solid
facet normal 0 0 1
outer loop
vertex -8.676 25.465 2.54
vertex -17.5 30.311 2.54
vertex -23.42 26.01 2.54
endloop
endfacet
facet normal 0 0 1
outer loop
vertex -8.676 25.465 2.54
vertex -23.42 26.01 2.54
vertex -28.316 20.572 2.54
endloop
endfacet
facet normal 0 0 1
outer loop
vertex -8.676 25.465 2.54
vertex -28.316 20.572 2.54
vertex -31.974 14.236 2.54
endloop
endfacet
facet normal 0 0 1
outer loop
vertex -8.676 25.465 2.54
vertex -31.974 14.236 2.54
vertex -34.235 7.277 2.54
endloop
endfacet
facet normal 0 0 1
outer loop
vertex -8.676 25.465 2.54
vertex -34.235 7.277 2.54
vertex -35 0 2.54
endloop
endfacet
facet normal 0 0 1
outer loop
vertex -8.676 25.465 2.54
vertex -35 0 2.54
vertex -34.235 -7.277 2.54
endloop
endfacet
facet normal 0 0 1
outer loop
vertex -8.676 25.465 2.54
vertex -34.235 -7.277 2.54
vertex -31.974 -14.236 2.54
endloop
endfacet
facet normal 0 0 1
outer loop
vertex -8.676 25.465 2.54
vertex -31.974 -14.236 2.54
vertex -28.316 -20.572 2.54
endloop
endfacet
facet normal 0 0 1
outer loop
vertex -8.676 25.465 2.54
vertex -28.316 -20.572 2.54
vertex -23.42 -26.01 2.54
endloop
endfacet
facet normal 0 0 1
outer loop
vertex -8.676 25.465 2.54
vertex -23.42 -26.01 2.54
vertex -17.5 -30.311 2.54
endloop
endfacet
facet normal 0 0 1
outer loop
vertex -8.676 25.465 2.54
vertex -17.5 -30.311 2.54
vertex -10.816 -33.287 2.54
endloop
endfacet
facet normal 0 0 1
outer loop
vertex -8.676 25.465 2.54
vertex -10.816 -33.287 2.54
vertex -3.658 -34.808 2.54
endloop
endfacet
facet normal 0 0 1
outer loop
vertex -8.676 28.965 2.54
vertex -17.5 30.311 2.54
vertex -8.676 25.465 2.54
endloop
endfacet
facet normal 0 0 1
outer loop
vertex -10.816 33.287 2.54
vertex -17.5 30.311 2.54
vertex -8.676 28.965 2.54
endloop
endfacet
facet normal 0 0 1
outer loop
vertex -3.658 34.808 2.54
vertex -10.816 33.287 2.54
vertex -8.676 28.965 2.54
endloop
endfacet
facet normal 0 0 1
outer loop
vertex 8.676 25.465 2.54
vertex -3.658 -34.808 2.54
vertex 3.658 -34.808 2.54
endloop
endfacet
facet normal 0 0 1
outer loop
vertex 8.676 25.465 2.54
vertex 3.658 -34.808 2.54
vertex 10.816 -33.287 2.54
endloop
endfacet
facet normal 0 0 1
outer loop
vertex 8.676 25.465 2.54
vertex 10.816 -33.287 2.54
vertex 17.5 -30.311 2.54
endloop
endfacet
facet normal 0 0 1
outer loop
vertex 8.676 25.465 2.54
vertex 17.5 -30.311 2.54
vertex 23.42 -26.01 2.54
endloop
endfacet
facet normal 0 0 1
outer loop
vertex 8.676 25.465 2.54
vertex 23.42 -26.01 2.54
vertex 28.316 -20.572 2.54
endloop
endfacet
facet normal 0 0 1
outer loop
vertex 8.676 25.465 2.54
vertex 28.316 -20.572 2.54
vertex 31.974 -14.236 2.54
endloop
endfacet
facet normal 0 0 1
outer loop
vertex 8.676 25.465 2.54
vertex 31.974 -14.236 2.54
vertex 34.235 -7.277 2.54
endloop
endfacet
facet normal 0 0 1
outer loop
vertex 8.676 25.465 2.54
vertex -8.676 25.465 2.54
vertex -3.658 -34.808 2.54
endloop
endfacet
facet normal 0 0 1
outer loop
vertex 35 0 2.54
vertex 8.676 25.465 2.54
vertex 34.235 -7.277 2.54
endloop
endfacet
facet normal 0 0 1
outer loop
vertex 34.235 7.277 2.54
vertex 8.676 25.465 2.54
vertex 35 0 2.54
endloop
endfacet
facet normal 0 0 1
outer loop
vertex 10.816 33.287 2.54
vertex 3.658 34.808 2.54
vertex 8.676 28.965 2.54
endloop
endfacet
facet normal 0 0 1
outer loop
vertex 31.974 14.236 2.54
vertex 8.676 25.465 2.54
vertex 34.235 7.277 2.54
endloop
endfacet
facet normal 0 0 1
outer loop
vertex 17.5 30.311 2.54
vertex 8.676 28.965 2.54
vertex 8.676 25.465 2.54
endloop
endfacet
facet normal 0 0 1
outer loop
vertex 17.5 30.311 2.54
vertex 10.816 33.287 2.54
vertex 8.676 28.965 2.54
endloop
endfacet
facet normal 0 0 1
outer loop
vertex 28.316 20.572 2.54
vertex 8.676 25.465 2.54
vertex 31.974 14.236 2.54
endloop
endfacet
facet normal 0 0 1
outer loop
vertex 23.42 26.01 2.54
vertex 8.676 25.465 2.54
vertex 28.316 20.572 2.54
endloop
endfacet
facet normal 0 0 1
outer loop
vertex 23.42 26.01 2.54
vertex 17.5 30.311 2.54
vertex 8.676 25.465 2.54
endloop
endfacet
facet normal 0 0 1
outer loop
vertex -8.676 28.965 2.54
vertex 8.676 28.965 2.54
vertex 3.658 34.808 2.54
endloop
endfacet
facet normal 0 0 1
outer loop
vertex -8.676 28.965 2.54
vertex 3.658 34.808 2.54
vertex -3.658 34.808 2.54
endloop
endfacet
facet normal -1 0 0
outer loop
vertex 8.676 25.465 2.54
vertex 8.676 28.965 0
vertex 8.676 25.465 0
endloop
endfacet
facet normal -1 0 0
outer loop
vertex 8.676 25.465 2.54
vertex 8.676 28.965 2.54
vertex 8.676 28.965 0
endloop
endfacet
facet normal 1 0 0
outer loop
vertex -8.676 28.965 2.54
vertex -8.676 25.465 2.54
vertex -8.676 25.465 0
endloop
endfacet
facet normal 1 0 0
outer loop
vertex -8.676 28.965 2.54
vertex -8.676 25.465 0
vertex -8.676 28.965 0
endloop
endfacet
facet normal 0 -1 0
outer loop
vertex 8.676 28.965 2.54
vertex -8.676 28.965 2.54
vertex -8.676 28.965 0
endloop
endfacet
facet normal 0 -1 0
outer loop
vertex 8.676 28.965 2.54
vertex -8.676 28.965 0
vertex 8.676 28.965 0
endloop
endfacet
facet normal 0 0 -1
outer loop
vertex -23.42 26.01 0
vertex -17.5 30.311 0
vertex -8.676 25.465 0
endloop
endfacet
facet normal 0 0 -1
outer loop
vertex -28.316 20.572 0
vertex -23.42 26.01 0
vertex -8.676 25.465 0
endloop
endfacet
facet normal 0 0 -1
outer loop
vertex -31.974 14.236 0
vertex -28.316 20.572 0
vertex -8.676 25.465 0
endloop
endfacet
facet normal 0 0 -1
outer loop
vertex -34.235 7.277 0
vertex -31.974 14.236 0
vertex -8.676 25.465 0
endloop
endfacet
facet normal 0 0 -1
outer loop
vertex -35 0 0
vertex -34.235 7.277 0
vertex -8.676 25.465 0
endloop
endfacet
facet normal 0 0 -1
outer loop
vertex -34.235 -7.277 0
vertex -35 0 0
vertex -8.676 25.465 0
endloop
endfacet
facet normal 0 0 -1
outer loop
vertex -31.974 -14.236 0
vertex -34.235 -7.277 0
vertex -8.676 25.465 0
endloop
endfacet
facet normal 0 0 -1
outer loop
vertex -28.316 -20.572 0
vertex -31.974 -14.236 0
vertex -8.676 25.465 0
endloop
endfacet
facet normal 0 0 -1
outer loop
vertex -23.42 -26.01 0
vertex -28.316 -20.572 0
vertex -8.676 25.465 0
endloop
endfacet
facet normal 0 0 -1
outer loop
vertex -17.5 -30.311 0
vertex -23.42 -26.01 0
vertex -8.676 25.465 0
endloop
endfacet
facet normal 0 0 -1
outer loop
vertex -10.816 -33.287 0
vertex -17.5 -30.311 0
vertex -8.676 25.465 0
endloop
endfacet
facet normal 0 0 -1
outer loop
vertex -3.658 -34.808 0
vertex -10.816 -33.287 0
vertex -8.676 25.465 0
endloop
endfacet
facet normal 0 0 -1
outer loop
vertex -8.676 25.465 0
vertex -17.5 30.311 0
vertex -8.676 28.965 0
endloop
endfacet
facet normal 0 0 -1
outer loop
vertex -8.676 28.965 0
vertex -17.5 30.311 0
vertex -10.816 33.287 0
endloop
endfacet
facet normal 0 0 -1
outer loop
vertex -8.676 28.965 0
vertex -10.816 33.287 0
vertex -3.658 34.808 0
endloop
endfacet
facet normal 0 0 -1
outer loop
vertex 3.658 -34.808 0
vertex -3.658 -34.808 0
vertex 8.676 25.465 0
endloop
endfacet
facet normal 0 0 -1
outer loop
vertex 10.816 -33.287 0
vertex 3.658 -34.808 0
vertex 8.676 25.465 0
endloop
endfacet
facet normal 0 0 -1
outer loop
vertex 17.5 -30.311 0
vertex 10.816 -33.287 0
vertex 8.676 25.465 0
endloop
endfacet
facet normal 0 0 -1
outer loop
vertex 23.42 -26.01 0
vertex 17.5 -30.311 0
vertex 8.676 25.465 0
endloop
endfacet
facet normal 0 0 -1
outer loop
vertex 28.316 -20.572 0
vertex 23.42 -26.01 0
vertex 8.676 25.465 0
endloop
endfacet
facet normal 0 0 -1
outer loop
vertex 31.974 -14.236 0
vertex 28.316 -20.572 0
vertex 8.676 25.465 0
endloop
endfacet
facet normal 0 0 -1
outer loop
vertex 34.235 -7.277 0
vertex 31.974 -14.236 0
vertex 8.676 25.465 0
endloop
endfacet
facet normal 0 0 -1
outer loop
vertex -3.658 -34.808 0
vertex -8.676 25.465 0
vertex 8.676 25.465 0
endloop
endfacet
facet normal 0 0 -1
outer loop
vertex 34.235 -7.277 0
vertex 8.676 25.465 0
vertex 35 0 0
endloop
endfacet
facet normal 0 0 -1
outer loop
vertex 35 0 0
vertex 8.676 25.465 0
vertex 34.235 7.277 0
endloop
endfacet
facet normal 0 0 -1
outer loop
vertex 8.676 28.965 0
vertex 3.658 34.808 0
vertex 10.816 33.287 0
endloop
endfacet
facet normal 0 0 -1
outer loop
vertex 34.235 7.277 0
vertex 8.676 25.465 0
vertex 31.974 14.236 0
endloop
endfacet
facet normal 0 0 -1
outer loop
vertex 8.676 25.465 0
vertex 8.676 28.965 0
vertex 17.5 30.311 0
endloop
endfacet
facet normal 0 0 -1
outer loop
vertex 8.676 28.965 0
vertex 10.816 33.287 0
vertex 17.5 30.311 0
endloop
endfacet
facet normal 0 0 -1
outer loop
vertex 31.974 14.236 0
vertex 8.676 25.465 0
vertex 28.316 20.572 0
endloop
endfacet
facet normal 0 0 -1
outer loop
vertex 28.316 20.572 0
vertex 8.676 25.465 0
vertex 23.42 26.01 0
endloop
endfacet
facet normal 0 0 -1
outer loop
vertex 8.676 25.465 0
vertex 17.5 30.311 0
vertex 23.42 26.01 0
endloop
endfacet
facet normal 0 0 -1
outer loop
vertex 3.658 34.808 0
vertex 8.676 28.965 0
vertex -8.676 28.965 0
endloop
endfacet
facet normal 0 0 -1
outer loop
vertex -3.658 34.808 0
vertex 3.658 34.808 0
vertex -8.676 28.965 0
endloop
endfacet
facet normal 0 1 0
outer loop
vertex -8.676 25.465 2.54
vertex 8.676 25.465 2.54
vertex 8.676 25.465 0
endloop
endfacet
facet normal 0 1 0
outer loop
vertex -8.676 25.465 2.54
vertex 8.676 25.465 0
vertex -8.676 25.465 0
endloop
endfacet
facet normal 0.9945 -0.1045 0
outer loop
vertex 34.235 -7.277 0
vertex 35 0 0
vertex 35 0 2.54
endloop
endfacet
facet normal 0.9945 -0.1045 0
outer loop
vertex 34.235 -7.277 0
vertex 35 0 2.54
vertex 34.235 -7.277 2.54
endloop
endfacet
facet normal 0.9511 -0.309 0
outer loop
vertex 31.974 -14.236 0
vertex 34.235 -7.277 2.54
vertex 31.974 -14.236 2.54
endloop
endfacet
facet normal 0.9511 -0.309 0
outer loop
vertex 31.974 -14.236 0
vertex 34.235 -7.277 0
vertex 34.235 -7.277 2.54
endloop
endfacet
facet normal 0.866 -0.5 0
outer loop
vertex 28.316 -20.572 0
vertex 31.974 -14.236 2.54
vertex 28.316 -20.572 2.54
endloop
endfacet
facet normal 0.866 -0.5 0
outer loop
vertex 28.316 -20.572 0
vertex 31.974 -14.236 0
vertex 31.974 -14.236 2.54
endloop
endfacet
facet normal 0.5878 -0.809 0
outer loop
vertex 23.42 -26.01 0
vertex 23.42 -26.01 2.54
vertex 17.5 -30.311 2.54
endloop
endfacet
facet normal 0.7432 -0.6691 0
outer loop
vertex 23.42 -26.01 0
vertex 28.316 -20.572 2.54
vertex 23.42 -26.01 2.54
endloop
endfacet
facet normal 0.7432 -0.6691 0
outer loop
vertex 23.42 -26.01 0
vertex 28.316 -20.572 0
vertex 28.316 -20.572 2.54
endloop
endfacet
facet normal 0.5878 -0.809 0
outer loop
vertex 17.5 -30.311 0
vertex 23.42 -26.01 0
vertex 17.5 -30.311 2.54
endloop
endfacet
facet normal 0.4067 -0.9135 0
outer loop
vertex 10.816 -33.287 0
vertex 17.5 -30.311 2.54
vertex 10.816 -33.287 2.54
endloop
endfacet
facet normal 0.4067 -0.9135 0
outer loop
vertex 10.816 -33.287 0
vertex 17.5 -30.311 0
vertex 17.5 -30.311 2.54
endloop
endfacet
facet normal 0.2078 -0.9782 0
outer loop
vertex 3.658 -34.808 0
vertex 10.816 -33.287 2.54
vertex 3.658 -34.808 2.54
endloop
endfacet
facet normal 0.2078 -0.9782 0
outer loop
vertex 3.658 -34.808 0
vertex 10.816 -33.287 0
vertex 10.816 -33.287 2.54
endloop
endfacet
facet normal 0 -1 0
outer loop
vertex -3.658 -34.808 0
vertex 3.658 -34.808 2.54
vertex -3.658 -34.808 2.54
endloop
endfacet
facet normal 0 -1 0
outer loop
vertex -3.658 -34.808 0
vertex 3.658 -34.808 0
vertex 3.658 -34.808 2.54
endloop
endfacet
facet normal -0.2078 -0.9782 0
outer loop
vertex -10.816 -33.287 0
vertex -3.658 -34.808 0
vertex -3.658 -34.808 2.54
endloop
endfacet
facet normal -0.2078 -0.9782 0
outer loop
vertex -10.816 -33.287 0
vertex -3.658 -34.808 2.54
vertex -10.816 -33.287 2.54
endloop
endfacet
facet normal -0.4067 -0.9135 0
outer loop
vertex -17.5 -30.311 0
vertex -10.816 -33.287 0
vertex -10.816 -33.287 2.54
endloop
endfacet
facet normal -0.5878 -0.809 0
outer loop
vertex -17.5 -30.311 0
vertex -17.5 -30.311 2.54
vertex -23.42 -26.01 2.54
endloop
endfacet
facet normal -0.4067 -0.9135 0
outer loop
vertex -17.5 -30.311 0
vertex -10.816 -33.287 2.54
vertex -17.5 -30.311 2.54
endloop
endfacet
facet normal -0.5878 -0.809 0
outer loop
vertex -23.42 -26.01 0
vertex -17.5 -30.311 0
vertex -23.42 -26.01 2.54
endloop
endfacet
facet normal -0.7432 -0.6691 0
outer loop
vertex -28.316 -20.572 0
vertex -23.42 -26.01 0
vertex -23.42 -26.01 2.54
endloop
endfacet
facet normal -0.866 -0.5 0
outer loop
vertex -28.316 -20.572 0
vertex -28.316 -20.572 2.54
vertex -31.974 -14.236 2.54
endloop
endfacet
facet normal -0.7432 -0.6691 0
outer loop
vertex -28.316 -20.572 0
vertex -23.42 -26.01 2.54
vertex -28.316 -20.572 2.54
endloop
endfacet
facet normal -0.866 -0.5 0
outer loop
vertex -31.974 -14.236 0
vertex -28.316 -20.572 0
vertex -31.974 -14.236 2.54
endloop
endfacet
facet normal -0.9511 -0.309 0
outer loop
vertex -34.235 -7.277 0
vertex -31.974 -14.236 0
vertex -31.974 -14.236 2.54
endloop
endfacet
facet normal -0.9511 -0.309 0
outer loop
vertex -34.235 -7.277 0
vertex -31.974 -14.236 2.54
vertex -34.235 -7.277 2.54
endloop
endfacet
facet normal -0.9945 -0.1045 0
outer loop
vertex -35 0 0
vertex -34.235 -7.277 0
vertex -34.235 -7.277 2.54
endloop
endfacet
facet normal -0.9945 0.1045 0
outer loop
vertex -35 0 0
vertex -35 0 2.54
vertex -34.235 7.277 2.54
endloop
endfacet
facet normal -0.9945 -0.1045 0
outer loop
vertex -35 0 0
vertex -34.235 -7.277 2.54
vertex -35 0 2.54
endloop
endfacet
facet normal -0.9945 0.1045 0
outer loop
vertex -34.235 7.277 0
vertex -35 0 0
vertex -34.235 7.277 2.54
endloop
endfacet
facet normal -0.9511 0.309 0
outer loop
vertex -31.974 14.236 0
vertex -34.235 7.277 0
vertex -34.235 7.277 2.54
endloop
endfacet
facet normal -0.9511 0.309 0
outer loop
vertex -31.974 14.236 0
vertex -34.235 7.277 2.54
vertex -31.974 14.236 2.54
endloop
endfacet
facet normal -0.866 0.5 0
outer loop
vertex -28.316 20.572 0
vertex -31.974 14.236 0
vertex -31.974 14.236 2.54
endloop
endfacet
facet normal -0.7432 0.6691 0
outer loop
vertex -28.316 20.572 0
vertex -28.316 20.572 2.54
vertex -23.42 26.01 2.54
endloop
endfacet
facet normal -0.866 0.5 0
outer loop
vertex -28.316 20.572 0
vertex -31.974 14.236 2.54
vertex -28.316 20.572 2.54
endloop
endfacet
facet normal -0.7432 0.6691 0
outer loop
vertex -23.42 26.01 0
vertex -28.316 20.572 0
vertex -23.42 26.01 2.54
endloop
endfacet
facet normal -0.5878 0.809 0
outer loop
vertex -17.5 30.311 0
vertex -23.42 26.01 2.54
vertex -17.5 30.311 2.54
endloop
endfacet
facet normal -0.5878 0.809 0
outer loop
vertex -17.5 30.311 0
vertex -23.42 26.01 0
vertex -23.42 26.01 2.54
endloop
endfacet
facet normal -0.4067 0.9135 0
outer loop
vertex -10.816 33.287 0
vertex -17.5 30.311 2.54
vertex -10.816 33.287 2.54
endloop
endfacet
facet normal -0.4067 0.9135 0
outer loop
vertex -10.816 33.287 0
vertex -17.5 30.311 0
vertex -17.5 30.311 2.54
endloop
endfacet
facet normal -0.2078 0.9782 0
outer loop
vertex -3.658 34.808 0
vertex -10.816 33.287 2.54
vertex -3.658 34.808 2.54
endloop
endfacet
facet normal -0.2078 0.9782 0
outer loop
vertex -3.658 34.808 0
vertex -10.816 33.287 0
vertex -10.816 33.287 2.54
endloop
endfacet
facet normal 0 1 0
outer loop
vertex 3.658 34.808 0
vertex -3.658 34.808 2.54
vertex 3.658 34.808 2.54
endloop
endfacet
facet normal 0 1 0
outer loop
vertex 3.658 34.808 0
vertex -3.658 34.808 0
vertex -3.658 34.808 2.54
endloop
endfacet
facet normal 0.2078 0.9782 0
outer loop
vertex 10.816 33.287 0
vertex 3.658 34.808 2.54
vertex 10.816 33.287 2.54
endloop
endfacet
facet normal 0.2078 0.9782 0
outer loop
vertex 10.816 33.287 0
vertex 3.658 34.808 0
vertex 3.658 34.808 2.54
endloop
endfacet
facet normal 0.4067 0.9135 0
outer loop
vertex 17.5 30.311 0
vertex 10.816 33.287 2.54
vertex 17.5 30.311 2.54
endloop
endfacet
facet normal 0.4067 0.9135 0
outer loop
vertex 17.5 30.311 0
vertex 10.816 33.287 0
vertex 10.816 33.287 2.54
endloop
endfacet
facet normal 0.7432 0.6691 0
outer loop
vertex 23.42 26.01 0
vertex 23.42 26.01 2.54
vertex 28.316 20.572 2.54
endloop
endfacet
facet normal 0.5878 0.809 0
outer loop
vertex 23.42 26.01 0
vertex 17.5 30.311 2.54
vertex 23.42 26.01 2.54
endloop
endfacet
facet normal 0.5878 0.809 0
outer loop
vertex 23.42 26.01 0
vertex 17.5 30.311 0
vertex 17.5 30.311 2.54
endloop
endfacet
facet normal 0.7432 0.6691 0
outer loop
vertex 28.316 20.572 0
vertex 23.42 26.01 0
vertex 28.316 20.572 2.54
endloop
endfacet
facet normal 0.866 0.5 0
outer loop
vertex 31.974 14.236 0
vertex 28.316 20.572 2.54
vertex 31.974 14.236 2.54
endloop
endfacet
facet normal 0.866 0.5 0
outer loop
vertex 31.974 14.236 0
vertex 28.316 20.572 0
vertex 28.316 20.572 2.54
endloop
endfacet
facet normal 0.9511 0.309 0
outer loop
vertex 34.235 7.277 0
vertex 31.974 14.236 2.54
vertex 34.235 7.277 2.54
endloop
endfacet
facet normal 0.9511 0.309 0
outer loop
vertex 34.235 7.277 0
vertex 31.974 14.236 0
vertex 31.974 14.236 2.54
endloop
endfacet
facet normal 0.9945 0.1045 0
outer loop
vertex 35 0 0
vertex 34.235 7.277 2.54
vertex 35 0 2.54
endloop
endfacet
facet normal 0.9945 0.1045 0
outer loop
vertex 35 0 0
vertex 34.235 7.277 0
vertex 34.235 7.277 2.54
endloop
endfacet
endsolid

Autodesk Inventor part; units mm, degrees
ref_plane "YZ Plane" through (0, 0, 0) normal (1, 0, 0) x (0, 1, 0)
ref_plane "XZ Plane" through (0, 0, 0) normal (0, 1, 0) x (-1, 0, 0)
ref_plane "XY Plane" through (0, 0, 0) normal (0, 0, 1) x (1, 0, 0)
sketch "Sketch1" plane through (0, 0, 0) normal (0, 0, 1) x (1, 0, 0)
  circle A0 centre (0, 0) radius 35
  dimension "d0" = 70
extrude "Extrusion1" add sketch "Sketch1" along normal blind 2.54
sketch "Sketch2" plane through (0, 0, 2.54) normal (0, 0, 1) x (1, 0, 0)
  line L0 (0, 0) -> (0, 34.7042) construction
  line L1 (-8.676, 28.9646) -> (8.676, 28.9646)
  line L2 (8.676, 28.9646) -> (8.676, 25.4646)
  line L3 (8.676, 25.4646) -> (-8.676, 25.4646)
  line L4 (-8.676, 25.4646) -> (-8.676, 28.9646)
  line L5 (-8.676, 28.9646) -> (8.676, 25.4646) construction
  line L6 (8.676, 28.9646) -> (-8.676, 25.4646) construction
  point P0 (0, 27.2146)
  dimension "d3" = 17.3521
  dimension "d4" = 3.5
extrude "Extrusion2" cut sketch "Sketch2" against normal blind 2.54
sketch "Sketch3" plane through (0, 0, 2.54) normal (0, 0, 1) x (1, 0, 0)
  point P0 (0, 0)
properties part number "Light Ring Mount"
